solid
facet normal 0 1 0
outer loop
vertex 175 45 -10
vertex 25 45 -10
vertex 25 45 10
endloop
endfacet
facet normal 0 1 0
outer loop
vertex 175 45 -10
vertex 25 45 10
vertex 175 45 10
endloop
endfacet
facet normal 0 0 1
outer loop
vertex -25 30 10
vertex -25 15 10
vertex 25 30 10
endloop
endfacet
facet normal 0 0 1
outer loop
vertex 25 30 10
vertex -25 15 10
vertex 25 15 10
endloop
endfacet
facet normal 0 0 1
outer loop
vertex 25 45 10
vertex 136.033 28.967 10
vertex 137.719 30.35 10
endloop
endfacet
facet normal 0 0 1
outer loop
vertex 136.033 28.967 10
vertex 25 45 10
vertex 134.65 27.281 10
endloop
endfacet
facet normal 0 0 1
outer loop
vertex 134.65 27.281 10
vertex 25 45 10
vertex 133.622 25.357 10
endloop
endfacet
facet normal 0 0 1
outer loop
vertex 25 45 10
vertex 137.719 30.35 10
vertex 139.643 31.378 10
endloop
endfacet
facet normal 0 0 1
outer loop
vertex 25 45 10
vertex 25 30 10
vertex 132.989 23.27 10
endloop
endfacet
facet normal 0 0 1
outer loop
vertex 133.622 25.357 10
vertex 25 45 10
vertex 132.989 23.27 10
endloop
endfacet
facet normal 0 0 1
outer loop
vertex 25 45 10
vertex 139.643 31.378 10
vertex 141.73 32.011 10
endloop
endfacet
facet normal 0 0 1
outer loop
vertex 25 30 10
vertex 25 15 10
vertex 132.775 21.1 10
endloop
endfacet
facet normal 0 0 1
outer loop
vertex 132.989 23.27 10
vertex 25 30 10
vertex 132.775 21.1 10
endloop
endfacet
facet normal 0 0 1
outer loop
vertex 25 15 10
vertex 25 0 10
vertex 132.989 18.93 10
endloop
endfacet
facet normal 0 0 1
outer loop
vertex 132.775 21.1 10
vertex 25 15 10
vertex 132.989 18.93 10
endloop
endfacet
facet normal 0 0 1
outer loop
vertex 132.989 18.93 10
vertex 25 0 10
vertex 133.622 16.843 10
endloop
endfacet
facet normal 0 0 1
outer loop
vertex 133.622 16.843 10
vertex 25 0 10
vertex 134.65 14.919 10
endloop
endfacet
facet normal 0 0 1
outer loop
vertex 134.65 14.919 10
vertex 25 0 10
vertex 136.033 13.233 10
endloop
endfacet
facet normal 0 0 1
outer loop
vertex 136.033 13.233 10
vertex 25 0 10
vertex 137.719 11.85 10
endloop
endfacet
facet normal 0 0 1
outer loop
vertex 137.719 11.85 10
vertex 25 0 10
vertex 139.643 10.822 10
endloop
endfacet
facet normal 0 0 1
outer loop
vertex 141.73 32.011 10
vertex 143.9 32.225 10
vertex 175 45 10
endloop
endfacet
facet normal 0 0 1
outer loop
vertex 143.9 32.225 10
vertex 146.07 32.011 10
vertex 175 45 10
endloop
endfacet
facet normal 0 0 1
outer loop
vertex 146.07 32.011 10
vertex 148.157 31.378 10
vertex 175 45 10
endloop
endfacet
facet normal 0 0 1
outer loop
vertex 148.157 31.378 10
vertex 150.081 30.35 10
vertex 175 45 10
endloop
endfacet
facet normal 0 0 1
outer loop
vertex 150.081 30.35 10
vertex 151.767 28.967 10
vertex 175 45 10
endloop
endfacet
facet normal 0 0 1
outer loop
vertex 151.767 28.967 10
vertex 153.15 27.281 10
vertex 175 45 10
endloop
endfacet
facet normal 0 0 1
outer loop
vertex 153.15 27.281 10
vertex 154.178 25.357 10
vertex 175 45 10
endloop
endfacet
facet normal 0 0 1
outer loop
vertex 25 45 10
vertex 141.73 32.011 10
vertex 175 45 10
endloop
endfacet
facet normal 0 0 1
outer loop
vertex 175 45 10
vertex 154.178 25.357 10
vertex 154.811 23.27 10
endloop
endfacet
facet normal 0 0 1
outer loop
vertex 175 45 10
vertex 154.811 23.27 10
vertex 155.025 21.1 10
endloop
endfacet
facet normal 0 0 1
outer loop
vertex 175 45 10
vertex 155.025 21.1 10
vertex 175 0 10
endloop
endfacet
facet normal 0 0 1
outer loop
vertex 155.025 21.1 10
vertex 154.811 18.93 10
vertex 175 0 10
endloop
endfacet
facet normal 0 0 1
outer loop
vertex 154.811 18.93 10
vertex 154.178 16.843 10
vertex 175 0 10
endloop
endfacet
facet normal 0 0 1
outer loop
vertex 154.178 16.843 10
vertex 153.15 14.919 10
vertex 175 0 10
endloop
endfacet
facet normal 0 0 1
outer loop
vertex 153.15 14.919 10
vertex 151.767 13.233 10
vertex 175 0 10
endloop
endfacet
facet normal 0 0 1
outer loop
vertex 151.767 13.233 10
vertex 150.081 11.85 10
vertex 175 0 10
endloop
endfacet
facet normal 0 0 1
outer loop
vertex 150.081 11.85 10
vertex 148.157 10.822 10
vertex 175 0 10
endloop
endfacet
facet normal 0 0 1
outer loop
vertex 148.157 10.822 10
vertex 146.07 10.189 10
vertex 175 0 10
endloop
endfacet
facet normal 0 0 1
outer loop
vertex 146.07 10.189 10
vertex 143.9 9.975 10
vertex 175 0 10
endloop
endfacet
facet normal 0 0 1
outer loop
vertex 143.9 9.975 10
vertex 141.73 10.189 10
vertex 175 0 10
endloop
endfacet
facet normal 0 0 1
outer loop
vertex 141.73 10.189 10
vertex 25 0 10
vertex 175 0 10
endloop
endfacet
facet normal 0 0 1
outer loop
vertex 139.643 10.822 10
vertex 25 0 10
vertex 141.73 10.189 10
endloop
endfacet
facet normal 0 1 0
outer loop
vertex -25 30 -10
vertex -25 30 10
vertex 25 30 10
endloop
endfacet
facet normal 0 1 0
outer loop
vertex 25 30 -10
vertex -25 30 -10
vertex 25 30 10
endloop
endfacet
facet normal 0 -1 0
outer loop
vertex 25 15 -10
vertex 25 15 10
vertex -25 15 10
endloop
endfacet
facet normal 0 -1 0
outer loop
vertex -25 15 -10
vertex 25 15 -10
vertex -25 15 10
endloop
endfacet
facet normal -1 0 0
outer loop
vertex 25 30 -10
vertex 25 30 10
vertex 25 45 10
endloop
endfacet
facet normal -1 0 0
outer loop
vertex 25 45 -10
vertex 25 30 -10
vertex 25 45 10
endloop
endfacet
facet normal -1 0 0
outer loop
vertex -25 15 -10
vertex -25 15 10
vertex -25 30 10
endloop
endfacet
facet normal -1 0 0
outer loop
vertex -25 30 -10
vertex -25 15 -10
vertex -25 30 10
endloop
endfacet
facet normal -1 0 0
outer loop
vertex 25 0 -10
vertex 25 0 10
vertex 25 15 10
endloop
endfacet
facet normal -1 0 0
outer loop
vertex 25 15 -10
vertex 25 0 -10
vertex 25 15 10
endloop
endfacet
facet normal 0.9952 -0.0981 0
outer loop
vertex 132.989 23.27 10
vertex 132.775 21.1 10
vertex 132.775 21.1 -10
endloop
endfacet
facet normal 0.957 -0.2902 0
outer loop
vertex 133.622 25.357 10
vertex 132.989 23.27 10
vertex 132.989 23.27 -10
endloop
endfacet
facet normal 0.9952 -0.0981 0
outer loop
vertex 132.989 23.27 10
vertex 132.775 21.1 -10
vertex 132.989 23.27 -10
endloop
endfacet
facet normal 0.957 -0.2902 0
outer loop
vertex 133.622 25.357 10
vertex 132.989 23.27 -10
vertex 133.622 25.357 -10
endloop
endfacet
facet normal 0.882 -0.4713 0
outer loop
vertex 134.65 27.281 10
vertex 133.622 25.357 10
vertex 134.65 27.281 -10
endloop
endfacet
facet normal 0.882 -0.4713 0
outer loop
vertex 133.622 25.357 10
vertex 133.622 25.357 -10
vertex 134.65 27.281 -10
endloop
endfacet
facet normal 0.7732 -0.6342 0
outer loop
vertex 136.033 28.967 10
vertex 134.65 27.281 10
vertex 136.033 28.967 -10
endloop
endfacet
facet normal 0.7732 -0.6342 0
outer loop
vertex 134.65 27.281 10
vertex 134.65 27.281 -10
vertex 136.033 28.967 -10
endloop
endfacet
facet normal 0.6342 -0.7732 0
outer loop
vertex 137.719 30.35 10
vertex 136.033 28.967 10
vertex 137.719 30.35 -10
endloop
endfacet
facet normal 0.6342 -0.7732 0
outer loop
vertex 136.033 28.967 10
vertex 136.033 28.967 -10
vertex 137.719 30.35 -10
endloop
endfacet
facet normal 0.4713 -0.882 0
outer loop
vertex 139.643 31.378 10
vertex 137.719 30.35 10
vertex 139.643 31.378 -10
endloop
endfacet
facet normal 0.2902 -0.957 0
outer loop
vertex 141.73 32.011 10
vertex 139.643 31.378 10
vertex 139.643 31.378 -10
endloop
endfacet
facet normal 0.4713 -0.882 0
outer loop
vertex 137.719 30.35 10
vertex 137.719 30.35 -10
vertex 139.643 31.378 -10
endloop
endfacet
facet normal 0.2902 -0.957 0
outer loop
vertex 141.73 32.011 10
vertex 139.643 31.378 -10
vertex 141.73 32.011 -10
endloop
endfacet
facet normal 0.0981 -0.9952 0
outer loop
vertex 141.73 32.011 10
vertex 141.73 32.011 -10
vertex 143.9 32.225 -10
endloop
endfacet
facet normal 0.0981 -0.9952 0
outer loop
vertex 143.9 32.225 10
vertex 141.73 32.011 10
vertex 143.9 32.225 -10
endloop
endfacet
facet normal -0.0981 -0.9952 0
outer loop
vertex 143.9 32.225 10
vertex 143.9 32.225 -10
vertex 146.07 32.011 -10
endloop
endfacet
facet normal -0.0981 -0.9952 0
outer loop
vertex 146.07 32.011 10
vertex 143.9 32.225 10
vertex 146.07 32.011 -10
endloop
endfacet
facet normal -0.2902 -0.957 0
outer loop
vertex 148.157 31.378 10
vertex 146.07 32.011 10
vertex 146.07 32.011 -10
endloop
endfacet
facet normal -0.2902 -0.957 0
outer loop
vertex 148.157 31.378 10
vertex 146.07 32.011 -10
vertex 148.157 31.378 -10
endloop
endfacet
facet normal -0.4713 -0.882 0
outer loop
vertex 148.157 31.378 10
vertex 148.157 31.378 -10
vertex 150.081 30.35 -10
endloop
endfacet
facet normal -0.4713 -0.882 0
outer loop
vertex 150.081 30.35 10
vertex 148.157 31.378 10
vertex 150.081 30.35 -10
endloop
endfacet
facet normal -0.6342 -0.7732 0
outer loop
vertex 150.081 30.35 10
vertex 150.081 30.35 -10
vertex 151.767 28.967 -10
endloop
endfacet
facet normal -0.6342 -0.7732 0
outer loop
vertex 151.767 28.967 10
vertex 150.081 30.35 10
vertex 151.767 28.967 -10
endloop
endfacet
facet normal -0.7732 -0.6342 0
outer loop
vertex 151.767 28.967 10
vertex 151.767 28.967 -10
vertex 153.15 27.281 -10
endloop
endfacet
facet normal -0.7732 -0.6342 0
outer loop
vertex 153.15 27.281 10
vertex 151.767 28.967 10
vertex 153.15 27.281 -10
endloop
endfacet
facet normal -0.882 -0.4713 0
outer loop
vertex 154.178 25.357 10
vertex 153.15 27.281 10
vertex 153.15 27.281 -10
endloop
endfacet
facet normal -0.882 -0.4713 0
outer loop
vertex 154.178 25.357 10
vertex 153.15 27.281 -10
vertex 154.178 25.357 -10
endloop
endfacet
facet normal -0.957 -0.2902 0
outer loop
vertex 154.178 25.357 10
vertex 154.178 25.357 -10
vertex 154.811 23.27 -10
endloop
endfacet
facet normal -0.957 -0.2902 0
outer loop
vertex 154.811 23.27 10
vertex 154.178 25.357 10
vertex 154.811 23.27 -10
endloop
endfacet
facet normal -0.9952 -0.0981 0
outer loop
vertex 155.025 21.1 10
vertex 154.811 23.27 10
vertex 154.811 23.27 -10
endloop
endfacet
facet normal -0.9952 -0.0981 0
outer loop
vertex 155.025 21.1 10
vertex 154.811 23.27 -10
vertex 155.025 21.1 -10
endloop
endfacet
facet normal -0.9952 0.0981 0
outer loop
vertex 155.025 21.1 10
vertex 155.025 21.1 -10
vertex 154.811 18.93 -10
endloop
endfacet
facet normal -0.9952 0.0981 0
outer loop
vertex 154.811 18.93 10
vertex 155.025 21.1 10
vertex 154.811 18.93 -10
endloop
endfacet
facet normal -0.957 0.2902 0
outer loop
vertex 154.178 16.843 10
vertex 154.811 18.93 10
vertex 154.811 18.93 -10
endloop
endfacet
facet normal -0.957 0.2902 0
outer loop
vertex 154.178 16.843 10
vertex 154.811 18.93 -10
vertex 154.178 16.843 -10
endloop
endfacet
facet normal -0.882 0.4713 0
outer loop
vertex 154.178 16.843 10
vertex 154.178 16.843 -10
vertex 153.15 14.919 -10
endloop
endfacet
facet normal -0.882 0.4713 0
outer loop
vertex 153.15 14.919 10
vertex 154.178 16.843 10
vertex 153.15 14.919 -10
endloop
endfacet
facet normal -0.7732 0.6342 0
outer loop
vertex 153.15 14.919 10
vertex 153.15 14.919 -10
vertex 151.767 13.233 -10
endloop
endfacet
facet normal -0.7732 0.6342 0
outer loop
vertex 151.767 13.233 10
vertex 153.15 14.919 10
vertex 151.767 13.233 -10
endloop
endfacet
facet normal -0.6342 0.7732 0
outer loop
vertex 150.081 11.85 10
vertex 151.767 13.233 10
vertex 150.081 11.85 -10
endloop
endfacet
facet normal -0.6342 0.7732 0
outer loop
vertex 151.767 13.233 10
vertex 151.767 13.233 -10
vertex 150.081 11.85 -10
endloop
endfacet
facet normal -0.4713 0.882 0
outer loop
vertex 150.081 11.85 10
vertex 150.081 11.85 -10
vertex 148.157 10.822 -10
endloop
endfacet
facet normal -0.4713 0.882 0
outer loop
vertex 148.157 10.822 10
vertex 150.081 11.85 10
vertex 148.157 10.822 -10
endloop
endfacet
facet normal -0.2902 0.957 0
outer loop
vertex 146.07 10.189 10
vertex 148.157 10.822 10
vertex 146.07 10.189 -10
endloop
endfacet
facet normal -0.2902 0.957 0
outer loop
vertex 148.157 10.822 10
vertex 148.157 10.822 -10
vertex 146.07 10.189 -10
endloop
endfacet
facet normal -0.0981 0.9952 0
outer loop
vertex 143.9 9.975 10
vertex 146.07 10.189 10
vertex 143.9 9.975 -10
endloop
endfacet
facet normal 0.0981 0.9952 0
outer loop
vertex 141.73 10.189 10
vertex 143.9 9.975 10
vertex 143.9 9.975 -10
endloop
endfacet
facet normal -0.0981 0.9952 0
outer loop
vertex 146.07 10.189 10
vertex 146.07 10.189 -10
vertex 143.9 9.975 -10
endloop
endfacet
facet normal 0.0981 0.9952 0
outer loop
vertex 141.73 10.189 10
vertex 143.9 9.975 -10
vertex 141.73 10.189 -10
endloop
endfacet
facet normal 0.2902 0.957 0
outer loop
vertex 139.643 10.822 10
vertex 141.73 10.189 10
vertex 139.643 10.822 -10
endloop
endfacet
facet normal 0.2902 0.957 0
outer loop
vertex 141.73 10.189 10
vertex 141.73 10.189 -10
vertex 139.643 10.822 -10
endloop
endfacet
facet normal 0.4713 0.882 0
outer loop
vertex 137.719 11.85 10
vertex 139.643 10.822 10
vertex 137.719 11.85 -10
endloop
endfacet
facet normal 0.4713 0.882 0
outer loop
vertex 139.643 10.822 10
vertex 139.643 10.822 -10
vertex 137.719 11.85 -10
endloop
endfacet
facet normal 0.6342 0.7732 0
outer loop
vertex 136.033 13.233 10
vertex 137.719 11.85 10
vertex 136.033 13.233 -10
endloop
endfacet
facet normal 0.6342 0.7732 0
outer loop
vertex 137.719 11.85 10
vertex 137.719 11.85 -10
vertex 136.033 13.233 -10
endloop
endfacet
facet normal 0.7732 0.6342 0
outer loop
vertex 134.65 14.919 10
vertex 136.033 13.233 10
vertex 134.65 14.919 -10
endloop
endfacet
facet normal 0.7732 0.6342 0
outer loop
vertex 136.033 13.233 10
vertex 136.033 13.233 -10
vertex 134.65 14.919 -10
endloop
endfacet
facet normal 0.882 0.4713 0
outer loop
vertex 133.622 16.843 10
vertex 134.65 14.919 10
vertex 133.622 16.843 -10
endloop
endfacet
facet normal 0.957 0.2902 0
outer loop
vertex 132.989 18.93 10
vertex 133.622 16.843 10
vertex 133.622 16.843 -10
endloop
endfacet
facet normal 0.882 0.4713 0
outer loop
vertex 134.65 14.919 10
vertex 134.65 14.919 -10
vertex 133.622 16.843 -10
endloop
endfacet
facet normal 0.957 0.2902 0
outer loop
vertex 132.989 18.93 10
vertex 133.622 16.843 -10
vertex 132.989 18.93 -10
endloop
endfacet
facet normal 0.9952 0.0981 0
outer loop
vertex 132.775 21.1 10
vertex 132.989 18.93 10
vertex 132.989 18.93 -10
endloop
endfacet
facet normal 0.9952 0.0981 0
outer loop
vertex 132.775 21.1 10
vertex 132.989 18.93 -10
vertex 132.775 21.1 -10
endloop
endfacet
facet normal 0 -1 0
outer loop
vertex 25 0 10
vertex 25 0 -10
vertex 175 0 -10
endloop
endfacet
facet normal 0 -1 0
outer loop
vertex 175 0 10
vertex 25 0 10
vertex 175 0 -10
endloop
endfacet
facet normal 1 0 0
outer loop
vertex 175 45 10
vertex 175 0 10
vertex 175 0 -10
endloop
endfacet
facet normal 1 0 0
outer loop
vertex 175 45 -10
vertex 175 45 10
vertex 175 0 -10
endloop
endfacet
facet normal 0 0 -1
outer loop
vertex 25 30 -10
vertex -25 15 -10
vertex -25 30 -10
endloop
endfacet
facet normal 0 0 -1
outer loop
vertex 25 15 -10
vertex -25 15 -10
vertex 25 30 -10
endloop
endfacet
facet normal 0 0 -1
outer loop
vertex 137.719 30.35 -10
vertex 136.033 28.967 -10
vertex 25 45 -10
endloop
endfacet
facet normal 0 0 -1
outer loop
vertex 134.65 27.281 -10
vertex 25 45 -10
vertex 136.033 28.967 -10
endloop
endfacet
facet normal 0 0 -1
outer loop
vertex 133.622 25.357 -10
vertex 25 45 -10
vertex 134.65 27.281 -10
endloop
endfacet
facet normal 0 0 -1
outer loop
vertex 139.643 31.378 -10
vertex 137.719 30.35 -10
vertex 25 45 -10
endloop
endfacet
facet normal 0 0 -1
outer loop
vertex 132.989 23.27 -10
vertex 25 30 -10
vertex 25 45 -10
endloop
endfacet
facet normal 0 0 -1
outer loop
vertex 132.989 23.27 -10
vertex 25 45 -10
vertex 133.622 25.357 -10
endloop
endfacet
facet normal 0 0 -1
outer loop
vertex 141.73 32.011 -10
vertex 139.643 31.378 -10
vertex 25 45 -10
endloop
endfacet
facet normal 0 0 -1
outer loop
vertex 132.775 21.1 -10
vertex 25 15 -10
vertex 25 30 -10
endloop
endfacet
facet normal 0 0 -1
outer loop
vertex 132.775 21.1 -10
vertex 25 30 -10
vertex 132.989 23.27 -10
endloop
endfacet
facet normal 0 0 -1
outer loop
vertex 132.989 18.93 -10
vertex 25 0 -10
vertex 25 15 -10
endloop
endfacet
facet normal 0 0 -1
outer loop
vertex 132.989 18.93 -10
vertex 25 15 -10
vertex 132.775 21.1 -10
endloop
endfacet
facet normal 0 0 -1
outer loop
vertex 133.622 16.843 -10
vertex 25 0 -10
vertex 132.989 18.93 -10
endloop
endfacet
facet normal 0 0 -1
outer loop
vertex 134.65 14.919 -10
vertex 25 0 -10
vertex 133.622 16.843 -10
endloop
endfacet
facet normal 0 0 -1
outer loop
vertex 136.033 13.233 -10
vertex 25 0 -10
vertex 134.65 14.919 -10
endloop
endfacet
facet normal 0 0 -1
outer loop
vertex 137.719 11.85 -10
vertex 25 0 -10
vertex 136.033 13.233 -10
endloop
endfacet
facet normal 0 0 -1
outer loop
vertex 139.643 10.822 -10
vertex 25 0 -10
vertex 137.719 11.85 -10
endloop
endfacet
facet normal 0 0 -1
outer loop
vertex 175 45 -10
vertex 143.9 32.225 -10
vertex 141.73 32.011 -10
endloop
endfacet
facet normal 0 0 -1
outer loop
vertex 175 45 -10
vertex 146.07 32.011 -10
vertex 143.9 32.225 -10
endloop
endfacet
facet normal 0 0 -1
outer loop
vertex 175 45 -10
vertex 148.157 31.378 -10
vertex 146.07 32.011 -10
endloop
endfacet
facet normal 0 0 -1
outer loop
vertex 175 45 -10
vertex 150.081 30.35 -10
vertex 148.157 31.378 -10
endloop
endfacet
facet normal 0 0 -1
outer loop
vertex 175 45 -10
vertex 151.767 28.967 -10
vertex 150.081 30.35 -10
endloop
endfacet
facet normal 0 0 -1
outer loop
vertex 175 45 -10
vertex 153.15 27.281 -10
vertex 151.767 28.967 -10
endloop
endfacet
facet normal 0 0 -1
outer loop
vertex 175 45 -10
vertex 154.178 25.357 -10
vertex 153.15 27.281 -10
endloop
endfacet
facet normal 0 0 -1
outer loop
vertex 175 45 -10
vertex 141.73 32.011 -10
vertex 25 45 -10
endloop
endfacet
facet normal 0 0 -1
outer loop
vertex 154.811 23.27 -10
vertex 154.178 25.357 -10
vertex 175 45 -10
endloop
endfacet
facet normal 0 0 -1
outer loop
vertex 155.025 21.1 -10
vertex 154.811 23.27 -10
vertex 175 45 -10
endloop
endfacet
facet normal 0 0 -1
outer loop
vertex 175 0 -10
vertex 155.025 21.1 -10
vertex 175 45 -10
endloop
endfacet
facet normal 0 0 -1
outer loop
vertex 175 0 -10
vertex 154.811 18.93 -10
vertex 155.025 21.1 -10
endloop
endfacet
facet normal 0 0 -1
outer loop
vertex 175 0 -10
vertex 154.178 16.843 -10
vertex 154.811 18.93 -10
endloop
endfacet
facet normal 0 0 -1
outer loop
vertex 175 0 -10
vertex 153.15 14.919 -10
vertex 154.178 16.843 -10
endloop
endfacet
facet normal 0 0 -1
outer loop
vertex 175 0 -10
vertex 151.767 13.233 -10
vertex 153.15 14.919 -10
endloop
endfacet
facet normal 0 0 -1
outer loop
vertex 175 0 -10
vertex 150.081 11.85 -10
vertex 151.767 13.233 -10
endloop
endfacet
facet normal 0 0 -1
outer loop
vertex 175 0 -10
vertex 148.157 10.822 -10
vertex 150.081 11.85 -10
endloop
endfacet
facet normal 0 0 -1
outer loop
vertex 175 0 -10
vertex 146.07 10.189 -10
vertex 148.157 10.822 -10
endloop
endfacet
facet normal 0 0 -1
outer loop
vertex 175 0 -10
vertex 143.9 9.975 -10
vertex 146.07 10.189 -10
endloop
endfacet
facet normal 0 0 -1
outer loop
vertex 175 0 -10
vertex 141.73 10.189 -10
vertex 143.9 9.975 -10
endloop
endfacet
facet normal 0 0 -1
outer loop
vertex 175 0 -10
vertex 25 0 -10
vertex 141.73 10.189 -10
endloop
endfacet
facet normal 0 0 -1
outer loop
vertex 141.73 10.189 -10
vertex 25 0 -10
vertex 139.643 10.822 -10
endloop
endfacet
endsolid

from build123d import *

# Parameters (mm, degrees)
CROQUIS1_W              = 350
CROQUIS1_H              = 20
SALIENTE_EXTRUIR1_DEPTH = 45
CROQUIS2_R              = 11.125
CORTAR_EXTRUIR1_DEPTH   = 182.796589627
CROQUIS3_R              = 11.125
CORTAR_EXTRUIR3_DEPTH   = 182.796589627


with BuildPart() as part:
    # Croquis1 → Saliente-Extruir1 (new body)
    with BuildSketch(Plane(origin=(0, 0, 0), x_dir=(1, 0, 0), z_dir=(0, 1, 0))):
        Rectangle(CROQUIS1_W, CROQUIS1_H)
    extrude(amount=SALIENTE_EXTRUIR1_DEPTH)

    # Croquis2 → Cortar-Extruir1 (cut, through all)
    with BuildSketch(Plane(origin=(0, 0, -10), x_dir=(-1, 0, 0), z_dir=(0, 0, -1))):
        with Locations((-143.9, 21.1)):
            Circle(CROQUIS2_R)
    cortar_extruir1 = extrude(amount=-CORTAR_EXTRUIR1_DEPTH, mode=Mode.SUBTRACT)

    # Simetría1: Cortar-Extruir1 across plane
    add(cortar_extruir1.mirror(Plane(origin=(0, 0, 0), x_dir=(0, 0, 1), z_dir=(1, 0, 0))), mode=Mode.SUBTRACT)

    # Croquis3 → Cortar-Extruir3 (cut, through all)
    with BuildSketch(Plane.XY.offset(10)):
        Polygon((-175, 0), (0, 0), (25, 0), (25, 15), (-25, 15), (-25, 30), (25, 30), (25, 45), (-175, 45), align=None)
        with Locations((-143.9, 21.1)):
            Circle(CROQUIS3_R, mode=Mode.SUBTRACT)
    extrude(amount=-CORTAR_EXTRUIR3_DEPTH, mode=Mode.SUBTRACT)


solid = part.part
